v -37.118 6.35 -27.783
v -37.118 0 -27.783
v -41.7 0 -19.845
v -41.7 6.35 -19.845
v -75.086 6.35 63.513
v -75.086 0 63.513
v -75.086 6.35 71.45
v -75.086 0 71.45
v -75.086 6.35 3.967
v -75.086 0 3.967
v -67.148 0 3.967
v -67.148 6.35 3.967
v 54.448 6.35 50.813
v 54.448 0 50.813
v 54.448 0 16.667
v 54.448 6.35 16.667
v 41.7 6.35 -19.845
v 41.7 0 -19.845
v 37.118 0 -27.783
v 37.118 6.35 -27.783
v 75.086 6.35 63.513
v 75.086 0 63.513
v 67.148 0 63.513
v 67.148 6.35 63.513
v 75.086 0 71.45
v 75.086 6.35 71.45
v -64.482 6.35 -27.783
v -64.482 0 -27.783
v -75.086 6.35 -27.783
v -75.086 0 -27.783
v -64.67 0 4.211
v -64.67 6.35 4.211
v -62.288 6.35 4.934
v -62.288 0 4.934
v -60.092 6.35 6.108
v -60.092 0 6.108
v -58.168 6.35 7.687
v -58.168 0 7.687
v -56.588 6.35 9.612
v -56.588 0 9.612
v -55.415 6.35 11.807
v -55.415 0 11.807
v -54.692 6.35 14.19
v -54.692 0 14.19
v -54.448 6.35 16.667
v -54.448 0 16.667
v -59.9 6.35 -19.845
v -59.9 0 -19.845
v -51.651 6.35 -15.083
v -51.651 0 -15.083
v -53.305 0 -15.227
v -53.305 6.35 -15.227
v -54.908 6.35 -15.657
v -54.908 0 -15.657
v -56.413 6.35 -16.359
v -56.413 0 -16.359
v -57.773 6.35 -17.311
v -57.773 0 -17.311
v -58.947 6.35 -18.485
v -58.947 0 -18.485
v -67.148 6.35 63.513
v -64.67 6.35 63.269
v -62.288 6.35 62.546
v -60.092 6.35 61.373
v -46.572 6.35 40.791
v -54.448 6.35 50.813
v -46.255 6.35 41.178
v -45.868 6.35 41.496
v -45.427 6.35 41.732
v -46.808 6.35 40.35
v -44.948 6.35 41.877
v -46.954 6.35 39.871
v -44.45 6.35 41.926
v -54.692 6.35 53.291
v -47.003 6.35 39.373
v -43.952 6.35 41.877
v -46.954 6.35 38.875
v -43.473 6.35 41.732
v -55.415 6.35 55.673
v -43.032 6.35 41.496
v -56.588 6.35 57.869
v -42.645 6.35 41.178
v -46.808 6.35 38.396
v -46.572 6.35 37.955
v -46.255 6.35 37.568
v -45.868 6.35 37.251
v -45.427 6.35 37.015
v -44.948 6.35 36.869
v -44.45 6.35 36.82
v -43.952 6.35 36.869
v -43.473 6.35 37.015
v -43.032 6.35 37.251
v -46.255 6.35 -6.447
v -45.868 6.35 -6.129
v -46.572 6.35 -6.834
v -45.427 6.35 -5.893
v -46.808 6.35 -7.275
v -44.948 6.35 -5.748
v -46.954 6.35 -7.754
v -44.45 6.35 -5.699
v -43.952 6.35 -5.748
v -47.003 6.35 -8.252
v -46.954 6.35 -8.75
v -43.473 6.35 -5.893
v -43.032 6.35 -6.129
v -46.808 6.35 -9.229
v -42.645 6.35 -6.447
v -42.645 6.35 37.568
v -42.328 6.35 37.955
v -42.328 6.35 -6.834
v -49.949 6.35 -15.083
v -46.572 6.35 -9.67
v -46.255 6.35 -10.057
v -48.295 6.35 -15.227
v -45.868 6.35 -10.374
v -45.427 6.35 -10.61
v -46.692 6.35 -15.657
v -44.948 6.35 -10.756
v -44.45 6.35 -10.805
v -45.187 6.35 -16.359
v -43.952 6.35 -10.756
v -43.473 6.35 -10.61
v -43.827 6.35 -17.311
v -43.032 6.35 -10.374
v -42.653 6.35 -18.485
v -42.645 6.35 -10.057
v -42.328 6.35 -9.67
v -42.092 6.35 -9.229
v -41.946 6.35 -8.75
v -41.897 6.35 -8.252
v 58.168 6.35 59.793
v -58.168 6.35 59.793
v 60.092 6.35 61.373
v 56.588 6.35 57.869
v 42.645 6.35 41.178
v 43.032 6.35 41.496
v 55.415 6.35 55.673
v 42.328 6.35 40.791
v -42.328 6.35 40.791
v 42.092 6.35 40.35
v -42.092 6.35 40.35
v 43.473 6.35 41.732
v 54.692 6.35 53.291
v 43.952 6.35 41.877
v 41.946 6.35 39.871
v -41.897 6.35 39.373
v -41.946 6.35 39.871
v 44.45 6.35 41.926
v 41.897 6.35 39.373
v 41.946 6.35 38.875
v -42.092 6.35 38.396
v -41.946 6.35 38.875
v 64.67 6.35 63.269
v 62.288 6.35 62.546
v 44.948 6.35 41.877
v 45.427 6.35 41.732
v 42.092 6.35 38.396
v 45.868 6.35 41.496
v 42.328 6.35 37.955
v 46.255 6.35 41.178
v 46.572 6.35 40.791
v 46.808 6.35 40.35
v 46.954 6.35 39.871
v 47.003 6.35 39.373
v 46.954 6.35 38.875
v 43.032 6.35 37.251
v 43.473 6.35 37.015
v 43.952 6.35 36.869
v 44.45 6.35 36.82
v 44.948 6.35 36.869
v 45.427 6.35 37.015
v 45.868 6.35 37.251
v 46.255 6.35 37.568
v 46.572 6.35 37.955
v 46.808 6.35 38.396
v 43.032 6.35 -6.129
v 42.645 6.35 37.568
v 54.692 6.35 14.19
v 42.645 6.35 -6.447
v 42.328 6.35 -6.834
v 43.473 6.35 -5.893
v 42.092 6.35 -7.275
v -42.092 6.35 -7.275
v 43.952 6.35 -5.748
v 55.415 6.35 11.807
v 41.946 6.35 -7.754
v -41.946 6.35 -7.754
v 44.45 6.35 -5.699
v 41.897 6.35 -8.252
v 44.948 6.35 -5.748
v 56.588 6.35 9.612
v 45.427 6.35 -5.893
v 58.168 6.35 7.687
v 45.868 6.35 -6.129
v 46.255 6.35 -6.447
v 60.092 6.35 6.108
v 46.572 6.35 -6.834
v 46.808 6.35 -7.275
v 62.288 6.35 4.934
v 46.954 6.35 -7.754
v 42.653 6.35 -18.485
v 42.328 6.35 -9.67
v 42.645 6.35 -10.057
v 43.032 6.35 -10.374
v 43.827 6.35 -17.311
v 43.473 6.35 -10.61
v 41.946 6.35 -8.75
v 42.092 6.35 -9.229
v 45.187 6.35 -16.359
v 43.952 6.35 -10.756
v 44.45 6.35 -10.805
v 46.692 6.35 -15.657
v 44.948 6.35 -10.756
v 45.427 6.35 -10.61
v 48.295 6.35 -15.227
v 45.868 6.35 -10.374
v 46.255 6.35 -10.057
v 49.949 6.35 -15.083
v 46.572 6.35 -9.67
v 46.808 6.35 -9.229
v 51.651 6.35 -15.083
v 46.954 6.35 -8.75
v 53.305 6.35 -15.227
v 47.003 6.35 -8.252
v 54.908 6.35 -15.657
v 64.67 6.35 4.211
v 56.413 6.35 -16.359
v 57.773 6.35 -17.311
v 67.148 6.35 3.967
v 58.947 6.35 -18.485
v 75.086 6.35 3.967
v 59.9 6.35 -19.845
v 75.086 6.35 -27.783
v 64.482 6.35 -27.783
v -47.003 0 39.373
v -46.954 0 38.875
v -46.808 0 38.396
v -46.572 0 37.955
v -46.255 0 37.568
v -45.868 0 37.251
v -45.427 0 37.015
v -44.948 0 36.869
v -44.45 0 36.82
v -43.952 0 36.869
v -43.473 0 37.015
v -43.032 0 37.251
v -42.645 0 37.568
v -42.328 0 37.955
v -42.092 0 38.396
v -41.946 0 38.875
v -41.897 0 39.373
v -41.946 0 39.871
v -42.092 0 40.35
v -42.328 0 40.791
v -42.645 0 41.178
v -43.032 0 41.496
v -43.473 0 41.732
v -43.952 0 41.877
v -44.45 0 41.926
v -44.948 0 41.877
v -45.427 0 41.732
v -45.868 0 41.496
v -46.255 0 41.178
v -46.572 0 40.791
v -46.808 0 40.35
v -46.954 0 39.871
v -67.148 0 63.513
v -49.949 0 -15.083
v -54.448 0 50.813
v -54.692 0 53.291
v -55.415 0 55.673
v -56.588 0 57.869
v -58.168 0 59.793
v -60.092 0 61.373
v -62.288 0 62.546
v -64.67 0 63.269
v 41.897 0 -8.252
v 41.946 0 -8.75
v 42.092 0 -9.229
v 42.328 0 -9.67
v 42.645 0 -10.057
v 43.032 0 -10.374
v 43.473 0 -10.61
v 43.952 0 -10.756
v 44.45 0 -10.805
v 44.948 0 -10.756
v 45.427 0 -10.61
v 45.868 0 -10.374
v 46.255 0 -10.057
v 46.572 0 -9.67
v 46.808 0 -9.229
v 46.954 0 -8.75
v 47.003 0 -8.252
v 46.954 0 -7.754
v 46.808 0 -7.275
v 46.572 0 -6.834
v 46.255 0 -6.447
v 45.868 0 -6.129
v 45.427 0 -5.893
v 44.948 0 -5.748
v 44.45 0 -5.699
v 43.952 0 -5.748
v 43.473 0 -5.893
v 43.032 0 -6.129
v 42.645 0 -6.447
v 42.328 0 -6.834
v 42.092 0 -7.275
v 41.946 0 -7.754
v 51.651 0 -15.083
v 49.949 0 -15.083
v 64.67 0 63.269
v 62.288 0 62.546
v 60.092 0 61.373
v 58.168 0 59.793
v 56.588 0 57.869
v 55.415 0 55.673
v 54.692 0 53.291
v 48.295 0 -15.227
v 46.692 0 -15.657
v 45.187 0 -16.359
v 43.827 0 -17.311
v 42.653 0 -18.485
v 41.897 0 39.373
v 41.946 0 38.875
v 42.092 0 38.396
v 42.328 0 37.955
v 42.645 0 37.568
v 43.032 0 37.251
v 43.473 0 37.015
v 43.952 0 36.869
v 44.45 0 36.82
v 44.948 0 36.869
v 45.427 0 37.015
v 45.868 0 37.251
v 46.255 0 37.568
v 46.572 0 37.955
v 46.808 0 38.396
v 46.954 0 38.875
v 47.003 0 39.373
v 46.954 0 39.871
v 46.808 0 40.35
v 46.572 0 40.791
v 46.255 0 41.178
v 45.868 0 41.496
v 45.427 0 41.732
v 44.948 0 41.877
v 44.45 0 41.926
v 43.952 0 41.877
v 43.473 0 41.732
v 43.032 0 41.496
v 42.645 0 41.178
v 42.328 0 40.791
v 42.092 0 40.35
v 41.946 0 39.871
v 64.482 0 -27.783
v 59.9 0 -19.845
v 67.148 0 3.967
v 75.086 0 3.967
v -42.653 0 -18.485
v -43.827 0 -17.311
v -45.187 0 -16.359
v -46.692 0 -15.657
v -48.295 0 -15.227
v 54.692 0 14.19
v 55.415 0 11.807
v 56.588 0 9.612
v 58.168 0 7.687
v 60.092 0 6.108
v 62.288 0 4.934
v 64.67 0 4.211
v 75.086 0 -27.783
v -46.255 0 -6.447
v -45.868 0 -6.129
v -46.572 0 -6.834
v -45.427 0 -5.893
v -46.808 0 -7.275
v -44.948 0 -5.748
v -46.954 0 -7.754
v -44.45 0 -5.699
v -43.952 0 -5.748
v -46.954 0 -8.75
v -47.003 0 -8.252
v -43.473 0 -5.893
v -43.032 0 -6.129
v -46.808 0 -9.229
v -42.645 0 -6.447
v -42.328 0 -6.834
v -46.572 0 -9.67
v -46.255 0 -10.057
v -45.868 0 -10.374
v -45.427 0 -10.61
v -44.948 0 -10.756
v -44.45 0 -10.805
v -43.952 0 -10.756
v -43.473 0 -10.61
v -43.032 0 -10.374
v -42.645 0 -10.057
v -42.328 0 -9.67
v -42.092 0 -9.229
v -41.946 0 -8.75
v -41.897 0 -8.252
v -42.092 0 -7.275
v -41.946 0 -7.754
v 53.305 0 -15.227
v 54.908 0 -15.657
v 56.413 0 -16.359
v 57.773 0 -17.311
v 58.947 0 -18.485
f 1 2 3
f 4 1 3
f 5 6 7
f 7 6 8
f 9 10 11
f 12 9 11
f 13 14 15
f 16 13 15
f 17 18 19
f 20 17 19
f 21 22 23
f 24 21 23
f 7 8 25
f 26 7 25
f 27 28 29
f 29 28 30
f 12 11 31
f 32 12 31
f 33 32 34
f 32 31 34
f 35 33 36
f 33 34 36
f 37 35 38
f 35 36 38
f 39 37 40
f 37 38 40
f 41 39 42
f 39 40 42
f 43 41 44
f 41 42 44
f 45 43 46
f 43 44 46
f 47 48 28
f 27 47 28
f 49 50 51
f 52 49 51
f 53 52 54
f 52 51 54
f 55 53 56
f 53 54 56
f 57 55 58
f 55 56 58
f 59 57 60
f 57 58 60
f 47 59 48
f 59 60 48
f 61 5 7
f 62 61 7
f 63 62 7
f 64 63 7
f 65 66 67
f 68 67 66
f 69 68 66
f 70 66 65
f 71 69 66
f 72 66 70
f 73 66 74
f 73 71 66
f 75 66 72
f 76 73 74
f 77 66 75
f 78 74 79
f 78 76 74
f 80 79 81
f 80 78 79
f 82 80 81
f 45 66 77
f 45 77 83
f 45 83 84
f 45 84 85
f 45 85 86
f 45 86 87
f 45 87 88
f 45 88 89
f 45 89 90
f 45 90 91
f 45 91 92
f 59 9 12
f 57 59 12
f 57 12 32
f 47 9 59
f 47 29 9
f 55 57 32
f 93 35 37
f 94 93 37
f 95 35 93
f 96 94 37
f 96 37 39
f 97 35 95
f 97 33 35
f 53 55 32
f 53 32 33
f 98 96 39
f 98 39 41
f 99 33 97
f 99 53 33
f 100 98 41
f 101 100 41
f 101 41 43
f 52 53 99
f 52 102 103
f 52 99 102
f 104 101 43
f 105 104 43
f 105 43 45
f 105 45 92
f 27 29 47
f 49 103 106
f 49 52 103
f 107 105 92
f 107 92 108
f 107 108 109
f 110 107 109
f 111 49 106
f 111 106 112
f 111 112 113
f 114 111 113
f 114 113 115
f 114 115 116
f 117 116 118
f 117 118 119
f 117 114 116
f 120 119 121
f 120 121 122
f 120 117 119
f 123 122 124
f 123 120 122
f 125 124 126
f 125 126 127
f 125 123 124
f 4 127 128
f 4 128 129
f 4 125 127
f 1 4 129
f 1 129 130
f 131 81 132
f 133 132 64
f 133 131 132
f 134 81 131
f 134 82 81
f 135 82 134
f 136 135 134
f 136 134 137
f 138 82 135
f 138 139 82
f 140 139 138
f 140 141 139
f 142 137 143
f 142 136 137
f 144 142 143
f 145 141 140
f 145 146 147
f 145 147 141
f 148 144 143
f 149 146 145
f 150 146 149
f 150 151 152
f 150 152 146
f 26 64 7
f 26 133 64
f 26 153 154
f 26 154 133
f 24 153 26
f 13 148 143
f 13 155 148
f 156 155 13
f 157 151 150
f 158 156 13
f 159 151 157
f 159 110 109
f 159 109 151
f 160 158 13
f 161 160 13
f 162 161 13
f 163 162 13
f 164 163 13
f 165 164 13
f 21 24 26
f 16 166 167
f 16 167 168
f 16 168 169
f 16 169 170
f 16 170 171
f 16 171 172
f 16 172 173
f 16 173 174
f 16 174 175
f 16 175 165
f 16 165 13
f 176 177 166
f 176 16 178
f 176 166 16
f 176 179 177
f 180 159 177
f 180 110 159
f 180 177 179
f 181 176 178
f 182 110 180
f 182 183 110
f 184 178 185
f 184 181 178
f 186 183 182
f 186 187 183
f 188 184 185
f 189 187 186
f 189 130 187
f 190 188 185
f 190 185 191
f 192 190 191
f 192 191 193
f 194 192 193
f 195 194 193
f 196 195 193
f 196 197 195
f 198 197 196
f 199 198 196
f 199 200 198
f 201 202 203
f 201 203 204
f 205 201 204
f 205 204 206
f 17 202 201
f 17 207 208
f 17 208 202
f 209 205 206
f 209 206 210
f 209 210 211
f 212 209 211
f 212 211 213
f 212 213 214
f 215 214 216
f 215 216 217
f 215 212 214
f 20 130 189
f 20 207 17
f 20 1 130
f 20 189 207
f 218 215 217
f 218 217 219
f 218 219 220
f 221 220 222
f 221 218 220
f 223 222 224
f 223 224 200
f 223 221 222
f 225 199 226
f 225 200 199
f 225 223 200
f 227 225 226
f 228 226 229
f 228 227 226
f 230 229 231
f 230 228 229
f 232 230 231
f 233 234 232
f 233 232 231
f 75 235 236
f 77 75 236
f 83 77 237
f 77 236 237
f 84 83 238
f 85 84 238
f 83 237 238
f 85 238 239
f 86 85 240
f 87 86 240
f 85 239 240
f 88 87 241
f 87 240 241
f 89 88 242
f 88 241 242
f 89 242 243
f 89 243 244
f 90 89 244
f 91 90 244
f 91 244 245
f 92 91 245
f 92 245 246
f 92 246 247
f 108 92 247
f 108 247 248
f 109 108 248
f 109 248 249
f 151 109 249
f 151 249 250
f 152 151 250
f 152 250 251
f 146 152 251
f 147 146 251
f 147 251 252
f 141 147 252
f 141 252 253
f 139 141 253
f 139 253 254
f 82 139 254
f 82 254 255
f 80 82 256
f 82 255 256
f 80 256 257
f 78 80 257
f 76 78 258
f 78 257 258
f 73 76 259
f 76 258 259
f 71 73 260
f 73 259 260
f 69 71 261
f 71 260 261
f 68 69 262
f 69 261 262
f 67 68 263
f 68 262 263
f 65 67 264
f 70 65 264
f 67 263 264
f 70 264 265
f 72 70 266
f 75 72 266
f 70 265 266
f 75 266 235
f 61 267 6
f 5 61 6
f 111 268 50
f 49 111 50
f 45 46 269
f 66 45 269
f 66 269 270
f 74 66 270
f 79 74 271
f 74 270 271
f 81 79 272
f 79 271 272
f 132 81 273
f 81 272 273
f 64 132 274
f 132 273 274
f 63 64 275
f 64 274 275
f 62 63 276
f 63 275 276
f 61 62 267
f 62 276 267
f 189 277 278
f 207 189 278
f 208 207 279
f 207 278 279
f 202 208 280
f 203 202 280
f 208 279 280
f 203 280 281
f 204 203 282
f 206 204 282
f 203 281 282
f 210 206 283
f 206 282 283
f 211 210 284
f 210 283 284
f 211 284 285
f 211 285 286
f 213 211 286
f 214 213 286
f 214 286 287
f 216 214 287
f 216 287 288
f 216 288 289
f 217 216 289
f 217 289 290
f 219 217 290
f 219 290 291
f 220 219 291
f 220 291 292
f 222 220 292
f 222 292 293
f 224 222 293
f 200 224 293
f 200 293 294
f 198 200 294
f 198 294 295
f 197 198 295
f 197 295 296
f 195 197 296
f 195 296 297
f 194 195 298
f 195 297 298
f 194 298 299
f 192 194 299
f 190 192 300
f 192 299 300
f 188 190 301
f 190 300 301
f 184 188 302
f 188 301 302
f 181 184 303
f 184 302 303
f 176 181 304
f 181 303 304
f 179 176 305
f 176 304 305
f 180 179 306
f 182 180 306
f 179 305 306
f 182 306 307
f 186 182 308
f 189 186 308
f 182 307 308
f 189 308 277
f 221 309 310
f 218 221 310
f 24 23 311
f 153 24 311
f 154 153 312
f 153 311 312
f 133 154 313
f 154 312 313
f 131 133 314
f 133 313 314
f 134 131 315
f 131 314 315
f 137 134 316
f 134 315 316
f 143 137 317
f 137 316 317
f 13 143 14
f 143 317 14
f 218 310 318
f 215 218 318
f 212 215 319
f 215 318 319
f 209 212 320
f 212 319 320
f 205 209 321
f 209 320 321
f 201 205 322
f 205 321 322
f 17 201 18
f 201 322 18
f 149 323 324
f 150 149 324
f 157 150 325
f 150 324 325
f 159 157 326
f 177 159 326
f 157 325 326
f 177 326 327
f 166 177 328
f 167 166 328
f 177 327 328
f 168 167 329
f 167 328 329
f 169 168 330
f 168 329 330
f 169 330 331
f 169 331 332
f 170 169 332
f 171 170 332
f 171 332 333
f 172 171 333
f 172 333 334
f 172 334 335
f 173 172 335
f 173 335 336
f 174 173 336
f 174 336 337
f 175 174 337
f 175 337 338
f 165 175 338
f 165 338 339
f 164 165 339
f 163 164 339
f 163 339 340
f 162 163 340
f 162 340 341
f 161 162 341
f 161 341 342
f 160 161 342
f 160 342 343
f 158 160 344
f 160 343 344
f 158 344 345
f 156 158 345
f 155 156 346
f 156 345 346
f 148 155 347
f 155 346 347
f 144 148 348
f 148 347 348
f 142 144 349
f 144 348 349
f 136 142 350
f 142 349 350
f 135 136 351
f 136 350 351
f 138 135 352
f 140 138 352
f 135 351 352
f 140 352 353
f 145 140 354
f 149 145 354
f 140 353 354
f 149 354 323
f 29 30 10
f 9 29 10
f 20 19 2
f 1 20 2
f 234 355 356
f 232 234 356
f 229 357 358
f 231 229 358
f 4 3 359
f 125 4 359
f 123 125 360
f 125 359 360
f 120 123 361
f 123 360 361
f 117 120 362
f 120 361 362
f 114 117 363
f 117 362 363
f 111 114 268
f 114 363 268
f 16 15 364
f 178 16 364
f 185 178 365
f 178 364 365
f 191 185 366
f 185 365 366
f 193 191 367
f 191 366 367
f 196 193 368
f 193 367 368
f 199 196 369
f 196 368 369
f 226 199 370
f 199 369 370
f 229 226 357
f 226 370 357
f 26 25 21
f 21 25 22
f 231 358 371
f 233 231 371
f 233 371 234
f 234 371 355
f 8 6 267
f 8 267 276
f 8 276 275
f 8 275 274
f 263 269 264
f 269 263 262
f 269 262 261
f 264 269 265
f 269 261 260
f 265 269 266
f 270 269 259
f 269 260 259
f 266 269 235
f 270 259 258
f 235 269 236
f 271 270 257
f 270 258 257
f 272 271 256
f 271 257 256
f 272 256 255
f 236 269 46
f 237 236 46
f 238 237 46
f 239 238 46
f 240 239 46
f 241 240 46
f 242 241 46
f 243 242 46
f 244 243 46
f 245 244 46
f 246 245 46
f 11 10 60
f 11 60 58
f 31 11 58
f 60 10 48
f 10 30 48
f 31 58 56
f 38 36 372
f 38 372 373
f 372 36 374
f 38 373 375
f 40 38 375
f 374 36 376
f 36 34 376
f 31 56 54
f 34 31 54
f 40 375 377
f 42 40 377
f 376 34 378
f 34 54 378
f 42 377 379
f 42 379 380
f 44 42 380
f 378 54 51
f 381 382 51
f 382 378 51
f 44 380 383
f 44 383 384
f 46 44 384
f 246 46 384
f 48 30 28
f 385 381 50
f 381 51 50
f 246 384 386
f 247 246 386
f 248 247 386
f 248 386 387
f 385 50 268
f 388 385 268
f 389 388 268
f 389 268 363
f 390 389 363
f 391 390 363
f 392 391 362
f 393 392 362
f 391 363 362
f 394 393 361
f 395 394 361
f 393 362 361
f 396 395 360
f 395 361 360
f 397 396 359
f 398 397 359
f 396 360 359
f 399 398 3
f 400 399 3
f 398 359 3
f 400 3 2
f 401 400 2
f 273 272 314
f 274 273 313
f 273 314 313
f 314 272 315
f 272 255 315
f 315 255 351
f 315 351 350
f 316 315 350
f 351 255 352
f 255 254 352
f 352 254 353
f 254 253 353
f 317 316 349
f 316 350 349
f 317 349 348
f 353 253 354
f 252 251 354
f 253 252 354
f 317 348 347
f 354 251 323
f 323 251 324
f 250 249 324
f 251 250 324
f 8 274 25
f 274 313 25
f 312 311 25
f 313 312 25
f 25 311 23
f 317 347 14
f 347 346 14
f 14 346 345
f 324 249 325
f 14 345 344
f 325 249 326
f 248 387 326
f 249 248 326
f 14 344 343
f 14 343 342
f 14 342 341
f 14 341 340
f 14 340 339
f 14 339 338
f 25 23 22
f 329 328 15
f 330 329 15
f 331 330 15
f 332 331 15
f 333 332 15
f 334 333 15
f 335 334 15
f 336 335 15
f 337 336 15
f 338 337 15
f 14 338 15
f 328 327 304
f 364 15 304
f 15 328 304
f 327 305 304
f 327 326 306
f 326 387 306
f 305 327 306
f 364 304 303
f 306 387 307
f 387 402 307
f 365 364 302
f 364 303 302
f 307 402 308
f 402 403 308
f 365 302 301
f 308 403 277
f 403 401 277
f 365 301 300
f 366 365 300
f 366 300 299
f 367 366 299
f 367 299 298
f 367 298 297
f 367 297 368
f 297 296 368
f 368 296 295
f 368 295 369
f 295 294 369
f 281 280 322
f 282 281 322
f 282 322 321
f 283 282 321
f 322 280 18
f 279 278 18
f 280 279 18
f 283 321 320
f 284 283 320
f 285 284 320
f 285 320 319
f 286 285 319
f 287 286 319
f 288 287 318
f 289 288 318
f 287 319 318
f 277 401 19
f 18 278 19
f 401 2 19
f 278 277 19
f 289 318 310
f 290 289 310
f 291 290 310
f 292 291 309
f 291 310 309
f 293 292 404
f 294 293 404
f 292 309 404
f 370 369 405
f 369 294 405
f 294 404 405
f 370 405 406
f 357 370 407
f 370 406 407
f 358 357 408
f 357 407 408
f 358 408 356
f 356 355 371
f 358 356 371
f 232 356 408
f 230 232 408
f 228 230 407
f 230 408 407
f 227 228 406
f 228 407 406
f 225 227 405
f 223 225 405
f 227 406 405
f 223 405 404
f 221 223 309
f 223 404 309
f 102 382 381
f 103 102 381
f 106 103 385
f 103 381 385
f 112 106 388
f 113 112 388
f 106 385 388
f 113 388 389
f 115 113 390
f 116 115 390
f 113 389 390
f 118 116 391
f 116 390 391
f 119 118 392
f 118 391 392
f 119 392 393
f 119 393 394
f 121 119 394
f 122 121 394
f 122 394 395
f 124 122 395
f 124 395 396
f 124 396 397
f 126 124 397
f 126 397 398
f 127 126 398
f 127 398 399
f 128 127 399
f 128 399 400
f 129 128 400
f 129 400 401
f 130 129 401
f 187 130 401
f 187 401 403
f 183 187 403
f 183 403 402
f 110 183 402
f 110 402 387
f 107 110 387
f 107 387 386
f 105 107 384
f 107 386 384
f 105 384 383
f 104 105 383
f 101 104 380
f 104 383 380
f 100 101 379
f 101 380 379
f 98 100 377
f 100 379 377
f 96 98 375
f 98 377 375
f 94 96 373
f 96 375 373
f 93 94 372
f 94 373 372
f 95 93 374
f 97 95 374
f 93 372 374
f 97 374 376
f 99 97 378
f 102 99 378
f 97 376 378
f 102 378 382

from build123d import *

# Parameters (mm, degrees)
BOSS_EXTRUDE1_DEPTH    = 6.35
F_10_CLEARANCE_HOLE1_D = 5.1054


with BuildPart() as part:
    # Sketch1 → Boss-Extrude1 (new body)
    with BuildSketch(Plane(origin=(0, 0, 0), x_dir=(1, 0, 0), z_dir=(0, 1, 0))):
        with BuildLine():
            Line((-54.448, -16.667265757), (-54.448, -50.812890909))
            ThreePointArc((-54.448, -50.812890909), (-58.167743879, -59.79314703), (-67.148, -63.512890909))
            Line((-67.148, -63.512890909), (-75.0855, -63.512890909))
            Line((-75.0855, -63.512890909), (-75.0855, -71.450390909))
            Line((-75.0855, -71.450390909), (75.0855, -71.450390909))
            Line((75.0855, -71.450390909), (75.0855, -63.512890909))
            Line((75.0855, -63.512890909), (67.148, -63.512890909))
            ThreePointArc((67.148, -63.512890909), (58.167743879, -59.79314703), (54.448, -50.812890909))
            Line((54.448, -50.812890909), (54.448, -16.667265757))
            ThreePointArc((54.448, -16.667265757), (58.167743879, -7.687009636), (67.148, -3.967265757))
            Line((67.148, -3.967265757), (75.0855, -3.967265757))
            Line((75.0855, -3.967265757), (75.0855, 27.782734243))
            Line((75.0855, 27.782734243), (64.482348419, 27.782734243))
            Line((64.482348419, 27.782734243), (59.899630657, 19.845234243))
            ThreePointArc((59.899630657, 19.845234243), (56.413238686, 16.358842272), (51.650738686, 15.082734243))
            Line((51.650738686, 15.082734243), (49.949261314, 15.082734243))
            ThreePointArc((49.949261314, 15.082734243), (45.186761314, 16.358842272), (41.700369343, 19.845234243))
            Line((41.700369343, 19.845234243), (37.117651581, 27.782734243))
            Line((37.117651581, 27.782734243), (-37.117651581, 27.782734243))
            Line((-37.117651581, 27.782734243), (-41.700369343, 19.845234243))
            ThreePointArc((-41.700369343, 19.845234243), (-45.186761314, 16.358842272), (-49.949261314, 15.082734243))
            Line((-49.949261314, 15.082734243), (-51.650738686, 15.082734243))
            ThreePointArc((-51.650738686, 15.082734243), (-56.413238686, 16.358842272), (-59.899630657, 19.845234243))
            Line((-59.899630657, 19.845234243), (-64.482348419, 27.782734243))
            Line((-64.482348419, 27.782734243), (-75.0855, 27.782734243))
            Line((-75.0855, 27.782734243), (-75.0855, -3.967265757))
            Line((-75.0855, -3.967265757), (-67.148, -3.967265757))
            ThreePointArc((-67.148, -3.967265757), (-58.167743879, -7.687009636), (-54.448, -16.667265757))
        make_face()
    extrude(amount=BOSS_EXTRUDE1_DEPTH)

    # #10 Clearance Hole1 (through all)
    with Locations(Plane(origin=(0, 6.35, 0), x_dir=(1, 0, 0), z_dir=(0, 1, 0))):
        with Locations((-44.449999955, 8.251852655), (-44.449999955, -39.373147345), (44.450000045, 8.251852655), (44.450000045, -39.373147345)):
            Hole(F_10_CLEARANCE_HOLE1_D / 2)


solid = part.part
